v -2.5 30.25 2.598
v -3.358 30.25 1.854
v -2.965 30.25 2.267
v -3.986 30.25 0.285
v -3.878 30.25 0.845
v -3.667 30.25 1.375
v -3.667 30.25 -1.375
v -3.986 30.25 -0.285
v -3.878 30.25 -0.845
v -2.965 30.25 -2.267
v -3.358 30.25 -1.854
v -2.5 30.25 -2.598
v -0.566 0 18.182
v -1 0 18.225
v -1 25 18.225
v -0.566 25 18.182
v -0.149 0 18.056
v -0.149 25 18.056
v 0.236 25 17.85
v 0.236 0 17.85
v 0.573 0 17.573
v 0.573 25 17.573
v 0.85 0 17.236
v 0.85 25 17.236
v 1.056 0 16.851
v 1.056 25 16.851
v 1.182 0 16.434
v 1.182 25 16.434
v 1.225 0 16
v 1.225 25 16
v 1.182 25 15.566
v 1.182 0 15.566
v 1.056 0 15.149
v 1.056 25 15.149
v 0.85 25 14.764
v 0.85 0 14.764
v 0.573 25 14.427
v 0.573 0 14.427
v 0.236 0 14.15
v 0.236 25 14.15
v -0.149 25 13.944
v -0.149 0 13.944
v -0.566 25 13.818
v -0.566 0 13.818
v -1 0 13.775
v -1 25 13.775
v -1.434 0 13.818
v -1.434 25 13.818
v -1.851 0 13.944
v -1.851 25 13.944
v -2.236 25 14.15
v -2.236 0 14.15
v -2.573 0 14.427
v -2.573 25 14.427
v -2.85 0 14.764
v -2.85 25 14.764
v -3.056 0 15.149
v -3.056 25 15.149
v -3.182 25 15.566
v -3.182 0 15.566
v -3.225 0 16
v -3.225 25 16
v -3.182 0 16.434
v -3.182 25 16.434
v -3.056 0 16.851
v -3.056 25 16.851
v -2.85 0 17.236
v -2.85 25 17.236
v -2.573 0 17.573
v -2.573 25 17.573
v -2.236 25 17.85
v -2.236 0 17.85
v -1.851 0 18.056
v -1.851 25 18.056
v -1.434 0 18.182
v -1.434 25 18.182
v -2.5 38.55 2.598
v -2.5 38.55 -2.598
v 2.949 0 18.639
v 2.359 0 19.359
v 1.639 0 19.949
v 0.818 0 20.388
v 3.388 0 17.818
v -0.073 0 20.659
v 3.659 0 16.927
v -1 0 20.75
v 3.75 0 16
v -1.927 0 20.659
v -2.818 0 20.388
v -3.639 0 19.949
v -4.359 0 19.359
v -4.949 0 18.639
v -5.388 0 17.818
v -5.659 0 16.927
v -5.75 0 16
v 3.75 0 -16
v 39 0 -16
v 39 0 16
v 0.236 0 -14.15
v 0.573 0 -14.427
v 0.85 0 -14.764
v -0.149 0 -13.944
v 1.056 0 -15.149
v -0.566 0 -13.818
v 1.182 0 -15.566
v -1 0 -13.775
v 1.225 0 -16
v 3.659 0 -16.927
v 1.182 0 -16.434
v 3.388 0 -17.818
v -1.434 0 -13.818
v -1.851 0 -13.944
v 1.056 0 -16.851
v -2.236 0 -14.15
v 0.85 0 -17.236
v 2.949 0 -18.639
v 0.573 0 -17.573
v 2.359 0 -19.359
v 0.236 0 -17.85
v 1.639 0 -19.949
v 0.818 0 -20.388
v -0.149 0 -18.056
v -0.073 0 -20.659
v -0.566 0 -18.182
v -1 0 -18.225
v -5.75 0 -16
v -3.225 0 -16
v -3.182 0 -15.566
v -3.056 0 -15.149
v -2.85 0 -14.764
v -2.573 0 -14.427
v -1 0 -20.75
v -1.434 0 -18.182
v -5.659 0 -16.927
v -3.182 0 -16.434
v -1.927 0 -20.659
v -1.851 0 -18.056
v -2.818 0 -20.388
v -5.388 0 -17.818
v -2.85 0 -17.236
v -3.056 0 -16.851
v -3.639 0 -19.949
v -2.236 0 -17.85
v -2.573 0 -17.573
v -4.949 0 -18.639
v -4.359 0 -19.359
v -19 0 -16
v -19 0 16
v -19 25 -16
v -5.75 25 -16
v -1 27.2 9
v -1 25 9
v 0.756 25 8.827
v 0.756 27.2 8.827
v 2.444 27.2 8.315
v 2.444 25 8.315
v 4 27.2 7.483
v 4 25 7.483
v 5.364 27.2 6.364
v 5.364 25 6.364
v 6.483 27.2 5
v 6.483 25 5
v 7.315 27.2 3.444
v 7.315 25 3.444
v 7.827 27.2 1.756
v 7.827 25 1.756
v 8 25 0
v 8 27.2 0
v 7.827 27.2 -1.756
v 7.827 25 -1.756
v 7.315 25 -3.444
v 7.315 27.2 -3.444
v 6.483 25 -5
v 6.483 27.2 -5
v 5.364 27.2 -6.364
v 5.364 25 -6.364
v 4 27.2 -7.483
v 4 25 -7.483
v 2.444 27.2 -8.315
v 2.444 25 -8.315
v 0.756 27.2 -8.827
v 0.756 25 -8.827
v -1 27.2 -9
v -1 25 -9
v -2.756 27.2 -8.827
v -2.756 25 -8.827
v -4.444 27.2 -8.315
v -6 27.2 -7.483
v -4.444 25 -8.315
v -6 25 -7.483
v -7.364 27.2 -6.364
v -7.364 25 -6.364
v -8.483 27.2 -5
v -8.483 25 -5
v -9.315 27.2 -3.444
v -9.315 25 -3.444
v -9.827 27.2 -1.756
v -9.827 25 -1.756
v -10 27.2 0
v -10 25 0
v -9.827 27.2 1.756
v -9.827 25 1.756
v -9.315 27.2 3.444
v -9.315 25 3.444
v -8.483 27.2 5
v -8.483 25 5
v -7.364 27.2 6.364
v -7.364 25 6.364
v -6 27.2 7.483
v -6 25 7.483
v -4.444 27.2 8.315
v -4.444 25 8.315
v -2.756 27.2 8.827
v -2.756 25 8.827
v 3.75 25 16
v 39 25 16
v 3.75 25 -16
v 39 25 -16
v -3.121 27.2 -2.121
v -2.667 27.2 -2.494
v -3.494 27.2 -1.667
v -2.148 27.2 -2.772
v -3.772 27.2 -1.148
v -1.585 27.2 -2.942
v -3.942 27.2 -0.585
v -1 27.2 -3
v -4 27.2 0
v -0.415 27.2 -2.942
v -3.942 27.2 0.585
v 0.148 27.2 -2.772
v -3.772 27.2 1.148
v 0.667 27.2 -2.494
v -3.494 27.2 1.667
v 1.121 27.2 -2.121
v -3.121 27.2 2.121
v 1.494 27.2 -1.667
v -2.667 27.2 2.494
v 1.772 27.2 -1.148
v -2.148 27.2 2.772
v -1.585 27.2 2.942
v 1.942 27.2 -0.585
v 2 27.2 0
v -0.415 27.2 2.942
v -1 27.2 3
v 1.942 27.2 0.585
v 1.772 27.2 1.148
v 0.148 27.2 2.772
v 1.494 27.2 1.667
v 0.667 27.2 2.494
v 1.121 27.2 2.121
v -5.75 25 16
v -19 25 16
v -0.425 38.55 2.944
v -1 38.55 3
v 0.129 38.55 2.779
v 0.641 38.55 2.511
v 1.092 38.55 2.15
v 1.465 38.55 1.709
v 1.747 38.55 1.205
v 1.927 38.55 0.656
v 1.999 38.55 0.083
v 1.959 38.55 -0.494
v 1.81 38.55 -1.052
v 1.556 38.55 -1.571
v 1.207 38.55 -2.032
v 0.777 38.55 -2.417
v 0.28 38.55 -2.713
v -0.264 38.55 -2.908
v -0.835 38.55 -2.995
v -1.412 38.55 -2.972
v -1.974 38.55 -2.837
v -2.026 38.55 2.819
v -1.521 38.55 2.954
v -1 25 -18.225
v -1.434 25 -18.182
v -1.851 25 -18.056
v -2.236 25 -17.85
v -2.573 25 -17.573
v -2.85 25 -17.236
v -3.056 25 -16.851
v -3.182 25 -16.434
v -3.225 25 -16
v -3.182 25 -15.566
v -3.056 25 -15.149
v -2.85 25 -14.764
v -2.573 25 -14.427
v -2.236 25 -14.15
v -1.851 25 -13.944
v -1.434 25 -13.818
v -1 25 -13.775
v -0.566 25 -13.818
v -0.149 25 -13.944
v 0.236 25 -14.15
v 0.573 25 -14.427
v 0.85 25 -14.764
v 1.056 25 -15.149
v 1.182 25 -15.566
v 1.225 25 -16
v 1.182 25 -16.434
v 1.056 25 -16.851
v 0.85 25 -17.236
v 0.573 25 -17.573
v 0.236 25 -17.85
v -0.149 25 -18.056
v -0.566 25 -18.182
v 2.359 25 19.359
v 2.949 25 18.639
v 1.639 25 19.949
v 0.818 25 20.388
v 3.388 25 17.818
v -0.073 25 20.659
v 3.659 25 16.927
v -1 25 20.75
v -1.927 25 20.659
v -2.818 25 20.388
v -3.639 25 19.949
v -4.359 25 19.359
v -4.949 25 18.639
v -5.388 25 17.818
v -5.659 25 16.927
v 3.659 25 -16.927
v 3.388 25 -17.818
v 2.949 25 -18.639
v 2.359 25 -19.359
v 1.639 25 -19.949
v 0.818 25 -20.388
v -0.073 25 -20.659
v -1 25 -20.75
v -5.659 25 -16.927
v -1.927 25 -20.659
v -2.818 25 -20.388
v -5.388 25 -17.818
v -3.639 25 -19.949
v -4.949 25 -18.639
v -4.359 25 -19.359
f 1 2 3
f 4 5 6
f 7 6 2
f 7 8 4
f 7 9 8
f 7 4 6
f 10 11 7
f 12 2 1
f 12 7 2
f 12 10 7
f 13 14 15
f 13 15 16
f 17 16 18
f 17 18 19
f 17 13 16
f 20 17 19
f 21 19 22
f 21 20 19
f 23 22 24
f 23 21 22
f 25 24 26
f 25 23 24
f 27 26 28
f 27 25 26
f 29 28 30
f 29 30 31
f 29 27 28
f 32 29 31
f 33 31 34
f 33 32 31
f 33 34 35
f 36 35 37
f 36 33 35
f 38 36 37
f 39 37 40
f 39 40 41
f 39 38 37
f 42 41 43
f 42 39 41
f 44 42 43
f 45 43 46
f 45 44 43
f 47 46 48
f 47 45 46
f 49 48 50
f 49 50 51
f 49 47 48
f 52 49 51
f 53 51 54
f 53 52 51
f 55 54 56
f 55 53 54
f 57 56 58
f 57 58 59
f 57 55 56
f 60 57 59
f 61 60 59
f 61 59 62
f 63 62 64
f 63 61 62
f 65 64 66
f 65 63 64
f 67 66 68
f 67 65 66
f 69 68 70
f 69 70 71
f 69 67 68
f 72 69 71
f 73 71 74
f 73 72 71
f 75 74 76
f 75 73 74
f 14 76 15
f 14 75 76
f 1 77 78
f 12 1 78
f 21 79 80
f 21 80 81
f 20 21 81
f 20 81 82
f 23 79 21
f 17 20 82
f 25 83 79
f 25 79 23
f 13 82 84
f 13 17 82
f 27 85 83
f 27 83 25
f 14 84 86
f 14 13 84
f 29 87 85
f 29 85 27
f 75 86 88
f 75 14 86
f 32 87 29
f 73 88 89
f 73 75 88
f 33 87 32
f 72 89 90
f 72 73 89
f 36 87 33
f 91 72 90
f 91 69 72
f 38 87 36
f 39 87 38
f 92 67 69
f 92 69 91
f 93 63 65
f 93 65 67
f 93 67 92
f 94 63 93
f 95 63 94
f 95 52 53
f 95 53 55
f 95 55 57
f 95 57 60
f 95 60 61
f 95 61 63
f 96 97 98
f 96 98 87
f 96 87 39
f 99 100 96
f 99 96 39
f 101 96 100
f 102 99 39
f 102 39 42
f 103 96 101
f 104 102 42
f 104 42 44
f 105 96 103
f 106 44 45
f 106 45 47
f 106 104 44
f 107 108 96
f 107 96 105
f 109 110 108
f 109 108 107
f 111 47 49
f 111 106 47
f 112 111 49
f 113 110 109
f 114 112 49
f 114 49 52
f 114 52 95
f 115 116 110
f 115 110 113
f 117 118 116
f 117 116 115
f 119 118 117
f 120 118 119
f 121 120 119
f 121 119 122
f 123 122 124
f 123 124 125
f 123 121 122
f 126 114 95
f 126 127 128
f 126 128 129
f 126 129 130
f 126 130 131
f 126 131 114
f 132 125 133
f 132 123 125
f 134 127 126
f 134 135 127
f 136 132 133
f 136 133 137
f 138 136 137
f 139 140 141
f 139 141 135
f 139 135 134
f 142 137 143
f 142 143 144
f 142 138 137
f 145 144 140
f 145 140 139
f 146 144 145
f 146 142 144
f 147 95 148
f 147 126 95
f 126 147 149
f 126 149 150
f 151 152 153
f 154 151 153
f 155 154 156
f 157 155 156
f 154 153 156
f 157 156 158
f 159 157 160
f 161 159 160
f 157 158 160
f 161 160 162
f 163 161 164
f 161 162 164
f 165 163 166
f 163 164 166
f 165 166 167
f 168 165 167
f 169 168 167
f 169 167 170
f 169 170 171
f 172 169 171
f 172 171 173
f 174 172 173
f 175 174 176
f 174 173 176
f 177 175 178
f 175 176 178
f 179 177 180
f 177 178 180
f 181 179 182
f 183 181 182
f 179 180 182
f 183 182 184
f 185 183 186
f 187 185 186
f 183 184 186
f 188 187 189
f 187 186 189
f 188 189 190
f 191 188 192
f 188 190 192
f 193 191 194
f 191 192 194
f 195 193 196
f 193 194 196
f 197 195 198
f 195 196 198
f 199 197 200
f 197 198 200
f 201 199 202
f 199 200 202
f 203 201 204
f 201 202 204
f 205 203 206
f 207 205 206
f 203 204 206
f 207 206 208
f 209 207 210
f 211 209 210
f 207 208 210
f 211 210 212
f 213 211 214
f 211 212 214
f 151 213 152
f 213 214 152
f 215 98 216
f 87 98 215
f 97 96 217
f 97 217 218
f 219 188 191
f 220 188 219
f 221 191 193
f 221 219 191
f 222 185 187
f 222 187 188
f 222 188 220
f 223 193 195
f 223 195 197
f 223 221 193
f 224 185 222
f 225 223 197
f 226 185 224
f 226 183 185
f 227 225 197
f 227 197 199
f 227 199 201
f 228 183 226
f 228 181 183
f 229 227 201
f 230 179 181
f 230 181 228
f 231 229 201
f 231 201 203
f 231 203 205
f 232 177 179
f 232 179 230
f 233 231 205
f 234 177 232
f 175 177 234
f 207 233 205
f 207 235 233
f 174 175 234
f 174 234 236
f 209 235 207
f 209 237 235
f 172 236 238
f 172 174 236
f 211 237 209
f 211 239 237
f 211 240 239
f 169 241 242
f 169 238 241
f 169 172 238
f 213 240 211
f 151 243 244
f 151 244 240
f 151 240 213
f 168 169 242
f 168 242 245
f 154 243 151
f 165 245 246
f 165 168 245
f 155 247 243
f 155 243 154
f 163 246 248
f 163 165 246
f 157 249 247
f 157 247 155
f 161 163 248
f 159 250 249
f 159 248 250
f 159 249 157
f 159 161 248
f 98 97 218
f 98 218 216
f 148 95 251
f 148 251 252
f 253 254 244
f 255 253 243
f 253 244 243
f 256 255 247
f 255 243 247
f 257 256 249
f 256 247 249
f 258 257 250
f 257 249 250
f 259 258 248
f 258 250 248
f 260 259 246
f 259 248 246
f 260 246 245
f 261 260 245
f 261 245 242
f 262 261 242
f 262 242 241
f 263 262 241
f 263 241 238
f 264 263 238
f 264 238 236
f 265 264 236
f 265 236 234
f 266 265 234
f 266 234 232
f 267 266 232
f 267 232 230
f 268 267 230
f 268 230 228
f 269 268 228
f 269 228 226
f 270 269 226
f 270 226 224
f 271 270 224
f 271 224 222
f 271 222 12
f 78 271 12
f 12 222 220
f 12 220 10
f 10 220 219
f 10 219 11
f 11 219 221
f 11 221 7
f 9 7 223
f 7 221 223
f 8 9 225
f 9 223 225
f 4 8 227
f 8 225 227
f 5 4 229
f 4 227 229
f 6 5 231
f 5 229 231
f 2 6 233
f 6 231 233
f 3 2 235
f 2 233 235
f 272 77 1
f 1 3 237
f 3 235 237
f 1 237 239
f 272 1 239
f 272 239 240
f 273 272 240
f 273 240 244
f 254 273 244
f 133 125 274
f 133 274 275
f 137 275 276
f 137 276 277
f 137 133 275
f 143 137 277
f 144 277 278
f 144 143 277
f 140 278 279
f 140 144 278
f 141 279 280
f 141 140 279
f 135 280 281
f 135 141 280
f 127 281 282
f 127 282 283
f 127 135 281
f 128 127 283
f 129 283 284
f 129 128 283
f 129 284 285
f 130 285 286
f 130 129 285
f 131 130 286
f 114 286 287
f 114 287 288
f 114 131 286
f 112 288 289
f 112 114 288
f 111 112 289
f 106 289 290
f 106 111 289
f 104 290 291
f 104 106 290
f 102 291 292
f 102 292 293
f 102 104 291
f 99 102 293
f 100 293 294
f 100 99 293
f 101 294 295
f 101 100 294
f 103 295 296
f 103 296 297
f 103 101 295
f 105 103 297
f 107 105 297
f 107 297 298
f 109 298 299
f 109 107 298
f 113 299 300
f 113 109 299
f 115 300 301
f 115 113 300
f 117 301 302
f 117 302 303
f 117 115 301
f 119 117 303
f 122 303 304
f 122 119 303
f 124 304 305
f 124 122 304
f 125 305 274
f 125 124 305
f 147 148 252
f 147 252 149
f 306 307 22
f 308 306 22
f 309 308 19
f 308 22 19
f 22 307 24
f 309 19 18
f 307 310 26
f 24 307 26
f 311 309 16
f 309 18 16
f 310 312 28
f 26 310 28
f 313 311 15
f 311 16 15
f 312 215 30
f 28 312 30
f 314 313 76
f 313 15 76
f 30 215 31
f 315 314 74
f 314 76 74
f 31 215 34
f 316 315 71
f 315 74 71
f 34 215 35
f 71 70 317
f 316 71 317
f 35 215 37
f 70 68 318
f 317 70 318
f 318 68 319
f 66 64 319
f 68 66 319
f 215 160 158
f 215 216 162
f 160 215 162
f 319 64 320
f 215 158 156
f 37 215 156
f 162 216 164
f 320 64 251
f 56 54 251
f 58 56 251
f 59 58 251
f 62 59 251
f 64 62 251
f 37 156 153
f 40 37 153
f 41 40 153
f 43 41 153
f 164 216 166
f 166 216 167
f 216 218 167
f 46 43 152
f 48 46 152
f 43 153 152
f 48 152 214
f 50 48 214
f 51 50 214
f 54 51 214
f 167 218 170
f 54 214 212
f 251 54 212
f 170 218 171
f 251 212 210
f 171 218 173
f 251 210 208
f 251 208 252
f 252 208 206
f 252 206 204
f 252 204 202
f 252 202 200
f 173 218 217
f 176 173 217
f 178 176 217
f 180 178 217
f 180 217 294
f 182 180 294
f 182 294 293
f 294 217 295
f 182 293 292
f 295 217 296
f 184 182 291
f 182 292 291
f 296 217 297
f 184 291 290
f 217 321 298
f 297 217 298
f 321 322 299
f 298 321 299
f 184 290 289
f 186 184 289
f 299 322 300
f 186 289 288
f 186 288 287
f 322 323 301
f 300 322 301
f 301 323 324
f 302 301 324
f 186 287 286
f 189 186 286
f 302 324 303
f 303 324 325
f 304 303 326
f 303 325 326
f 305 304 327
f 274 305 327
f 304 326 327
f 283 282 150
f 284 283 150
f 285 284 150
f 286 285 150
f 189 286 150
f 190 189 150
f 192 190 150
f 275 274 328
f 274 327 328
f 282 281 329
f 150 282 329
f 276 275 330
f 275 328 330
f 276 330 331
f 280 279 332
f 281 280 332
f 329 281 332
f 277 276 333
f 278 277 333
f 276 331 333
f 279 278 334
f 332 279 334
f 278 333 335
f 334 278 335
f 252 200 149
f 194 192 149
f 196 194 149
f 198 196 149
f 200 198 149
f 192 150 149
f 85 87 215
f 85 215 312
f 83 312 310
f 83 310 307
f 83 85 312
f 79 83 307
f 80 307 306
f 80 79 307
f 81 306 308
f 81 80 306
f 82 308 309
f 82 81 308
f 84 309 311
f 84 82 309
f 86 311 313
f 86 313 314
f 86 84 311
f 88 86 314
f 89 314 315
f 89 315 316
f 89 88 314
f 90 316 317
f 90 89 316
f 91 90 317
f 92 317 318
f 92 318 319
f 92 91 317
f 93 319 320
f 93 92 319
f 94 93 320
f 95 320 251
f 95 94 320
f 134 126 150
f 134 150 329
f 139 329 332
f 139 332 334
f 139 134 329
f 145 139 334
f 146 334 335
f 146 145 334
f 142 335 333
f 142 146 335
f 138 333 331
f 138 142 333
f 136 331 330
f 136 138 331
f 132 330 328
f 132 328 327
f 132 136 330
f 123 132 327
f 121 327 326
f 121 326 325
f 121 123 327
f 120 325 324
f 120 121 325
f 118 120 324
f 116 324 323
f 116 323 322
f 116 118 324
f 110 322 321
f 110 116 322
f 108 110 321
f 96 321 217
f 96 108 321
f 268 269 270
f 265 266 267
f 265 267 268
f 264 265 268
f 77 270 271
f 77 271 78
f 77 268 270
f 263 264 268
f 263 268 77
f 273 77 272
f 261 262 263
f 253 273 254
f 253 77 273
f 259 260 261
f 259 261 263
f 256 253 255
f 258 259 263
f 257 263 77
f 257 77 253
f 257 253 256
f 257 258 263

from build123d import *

# Parameters (mm, degrees)
SKETCH1_R           = 2.225
BOSS_EXTRUDE1_DEPTH = 25
SKETCH2_R           = 9
BOSS_EXTRUDE2_DEPTH = 2.2
SKETCH3_R           = 3
BOSS_EXTRUDE3_DEPTH = 11.35
SKETCH4_W           = 1.5
SKETCH4_H           = 6
CUT_EXTRUDE1_DEPTH  = 8.3


with BuildPart() as part:
    # Sketch1 → Boss-Extrude1 (new body)
    with BuildSketch(Plane(origin=(0, 0, 0), x_dir=(1, 0, 0), z_dir=(0, 1, 0))):
        with BuildLine():
            Line((-5.75, -16), (-19, -16))
            Line((-19, -16), (-19, 16))
            Line((-19, 16), (-5.75, 16))
            ThreePointArc((-5.75, 16), (-1, 20.75), (3.75, 16))
            Line((3.75, 16), (39, 16))
            Line((39, 16), (39, -16))
            Line((39, -16), (3.75, -16))
            ThreePointArc((3.75, -16), (-1, -20.75), (-5.75, -16))
        make_face()
        with Locations(Location((-1, -16, 0), (0, 0, 270))):
            Circle(SKETCH1_R, mode=Mode.SUBTRACT)
        with Locations(Location((-1, 16, 0), (0, 0, 90))):
            Circle(SKETCH1_R, mode=Mode.SUBTRACT)
    extrude(amount=BOSS_EXTRUDE1_DEPTH)

    # Sketch2 → Boss-Extrude2 (add)
    with BuildSketch(Plane(origin=(0, 25, 0), x_dir=(1, 0, 0), z_dir=(0, 1, 0))):
        with Locations(Location((-1, 0, 0), (0, 0, 270))):
            Circle(SKETCH2_R)
    extrude(amount=BOSS_EXTRUDE2_DEPTH)

    # Sketch3 → Boss-Extrude3 (add)
    with BuildSketch(Plane(origin=(0, 27.2, 0), x_dir=(1, 0, 0), z_dir=(0, 1, 0))):
        with Locations(Location((-1, 0, 0), (0, 0, 270))):
            Circle(SKETCH3_R)
    extrude(amount=BOSS_EXTRUDE3_DEPTH)

    # Sketch4 → Cut-Extrude1 (cut)
    with BuildSketch(Plane(origin=(0, 38.55, 0), x_dir=(1, 0, 0), z_dir=(0, 1, 0))):
        with Locations((-3.25, 0)):
            Rectangle(SKETCH4_W, SKETCH4_H)
    extrude(amount=-CUT_EXTRUDE1_DEPTH, mode=Mode.SUBTRACT)


solid = part.part
